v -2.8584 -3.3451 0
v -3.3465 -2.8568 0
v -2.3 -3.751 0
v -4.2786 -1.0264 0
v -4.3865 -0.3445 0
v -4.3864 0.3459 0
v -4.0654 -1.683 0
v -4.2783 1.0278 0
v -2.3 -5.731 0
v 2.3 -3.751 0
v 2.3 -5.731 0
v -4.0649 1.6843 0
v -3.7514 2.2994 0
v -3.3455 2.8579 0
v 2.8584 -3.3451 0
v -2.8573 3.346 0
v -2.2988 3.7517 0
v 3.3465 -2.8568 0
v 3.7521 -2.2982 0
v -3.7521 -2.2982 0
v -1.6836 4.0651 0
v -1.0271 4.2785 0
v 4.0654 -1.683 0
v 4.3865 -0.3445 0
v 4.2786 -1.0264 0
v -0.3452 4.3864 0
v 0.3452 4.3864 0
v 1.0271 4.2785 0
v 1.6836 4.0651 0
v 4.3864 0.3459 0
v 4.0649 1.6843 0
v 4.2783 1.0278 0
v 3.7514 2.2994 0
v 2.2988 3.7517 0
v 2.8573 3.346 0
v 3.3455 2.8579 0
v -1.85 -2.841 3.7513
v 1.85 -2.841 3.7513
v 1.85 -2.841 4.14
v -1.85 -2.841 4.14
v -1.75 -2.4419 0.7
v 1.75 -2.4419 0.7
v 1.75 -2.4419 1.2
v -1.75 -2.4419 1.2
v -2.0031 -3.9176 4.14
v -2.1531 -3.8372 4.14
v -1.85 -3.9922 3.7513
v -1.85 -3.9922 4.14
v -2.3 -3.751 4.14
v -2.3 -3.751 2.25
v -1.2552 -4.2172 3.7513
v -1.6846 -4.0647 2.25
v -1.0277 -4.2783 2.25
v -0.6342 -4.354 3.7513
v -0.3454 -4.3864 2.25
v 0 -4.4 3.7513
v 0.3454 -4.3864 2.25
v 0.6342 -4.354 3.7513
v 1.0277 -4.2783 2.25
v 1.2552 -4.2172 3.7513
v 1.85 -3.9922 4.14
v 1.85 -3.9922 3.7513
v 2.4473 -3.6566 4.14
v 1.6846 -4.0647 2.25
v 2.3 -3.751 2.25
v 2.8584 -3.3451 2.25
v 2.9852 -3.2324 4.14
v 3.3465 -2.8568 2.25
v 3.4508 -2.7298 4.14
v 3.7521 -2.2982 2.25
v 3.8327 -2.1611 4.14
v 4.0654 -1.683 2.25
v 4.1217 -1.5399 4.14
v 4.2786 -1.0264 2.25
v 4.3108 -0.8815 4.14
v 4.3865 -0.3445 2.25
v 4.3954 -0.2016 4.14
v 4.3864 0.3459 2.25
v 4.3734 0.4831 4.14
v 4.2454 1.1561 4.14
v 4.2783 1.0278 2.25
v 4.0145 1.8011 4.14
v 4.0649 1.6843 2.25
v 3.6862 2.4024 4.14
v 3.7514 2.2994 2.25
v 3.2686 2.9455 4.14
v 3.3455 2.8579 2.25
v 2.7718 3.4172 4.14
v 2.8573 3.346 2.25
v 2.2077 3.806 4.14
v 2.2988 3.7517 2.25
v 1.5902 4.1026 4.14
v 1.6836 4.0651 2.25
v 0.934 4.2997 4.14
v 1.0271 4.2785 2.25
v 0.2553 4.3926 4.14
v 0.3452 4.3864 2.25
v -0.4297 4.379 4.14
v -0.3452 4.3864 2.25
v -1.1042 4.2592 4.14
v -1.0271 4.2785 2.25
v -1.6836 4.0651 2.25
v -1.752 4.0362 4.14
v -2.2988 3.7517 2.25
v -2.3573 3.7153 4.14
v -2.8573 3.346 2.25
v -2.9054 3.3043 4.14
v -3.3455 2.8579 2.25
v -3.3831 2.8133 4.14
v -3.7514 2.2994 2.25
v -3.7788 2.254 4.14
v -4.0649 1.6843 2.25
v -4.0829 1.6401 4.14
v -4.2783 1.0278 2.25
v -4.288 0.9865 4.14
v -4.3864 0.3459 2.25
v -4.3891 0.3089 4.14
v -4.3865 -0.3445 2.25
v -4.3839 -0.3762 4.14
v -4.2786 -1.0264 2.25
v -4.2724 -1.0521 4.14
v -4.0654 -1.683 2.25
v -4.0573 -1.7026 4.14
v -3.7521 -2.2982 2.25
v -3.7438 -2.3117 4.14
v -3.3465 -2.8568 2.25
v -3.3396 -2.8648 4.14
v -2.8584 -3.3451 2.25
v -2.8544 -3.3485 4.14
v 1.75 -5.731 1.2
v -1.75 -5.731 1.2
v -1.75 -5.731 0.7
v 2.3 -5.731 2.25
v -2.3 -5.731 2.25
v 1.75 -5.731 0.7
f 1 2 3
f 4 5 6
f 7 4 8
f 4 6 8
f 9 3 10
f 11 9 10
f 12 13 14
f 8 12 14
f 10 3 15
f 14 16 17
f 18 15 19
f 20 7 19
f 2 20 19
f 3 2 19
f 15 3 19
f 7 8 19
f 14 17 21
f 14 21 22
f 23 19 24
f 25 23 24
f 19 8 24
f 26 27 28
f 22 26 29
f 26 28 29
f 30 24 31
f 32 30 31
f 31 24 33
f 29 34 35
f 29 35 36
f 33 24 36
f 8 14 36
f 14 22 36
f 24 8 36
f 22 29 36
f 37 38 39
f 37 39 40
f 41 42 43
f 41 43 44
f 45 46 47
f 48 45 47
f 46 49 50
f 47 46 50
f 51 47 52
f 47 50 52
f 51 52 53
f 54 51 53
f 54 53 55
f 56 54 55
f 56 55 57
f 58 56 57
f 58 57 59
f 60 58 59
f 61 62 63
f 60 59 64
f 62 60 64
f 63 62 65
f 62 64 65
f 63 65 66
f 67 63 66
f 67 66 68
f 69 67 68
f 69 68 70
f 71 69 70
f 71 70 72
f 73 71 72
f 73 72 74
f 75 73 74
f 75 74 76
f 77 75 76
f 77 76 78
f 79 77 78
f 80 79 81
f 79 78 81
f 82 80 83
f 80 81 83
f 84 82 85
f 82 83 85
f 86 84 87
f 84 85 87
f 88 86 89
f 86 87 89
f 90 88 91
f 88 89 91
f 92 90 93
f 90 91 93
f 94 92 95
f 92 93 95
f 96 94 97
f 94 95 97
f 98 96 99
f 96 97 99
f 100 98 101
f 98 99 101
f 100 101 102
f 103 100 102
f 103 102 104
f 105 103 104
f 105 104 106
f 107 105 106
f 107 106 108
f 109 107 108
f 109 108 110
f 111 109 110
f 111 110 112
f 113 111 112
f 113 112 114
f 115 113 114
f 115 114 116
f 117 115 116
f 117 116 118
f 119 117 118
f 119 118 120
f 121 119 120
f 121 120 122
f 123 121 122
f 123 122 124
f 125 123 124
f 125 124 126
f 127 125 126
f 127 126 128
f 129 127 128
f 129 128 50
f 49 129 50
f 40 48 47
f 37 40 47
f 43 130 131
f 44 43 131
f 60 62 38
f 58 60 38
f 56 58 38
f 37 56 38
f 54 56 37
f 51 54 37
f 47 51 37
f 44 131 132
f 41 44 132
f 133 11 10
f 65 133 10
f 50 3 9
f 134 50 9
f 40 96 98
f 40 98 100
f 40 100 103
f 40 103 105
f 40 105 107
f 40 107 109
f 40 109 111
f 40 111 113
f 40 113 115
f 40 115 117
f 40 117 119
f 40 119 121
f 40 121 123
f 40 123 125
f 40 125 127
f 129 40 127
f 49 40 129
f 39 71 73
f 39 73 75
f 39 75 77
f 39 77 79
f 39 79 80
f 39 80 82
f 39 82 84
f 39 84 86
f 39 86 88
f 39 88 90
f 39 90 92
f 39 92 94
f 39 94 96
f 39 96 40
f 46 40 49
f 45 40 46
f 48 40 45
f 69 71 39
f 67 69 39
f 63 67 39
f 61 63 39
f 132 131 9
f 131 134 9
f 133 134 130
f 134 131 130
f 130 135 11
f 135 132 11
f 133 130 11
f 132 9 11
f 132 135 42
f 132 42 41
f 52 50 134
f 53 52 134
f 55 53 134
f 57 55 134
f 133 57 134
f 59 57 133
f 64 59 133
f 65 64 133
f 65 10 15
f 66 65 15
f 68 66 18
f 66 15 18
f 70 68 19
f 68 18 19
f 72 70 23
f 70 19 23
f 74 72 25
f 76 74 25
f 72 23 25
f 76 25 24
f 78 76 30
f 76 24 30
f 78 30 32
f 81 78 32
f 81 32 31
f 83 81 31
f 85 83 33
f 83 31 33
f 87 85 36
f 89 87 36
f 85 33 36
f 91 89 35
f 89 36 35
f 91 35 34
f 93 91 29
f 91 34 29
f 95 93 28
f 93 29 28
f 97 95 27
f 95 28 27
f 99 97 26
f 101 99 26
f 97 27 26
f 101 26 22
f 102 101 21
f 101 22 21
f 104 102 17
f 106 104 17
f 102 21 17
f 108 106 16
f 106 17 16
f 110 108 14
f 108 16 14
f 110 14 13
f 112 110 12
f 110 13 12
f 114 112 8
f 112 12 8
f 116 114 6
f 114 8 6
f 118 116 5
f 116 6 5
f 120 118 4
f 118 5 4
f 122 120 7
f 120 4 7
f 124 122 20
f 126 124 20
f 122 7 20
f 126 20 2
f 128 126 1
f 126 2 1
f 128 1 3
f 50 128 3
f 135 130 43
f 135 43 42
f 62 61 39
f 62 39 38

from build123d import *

# Parameters (mm, degrees)
P_IDAT_VYSUNUT_M1_DEPTH  = 2.25
SKICA2_W                 = 3.5
SKICA2_H                 = 0.5
ODEBRAT_VYSUNUT_M1_DEPTH = 3.289126928
SKICA3_R                 = 4.4
P_IDAT_VYSUNUT_M2_DEPTH  = 1.89
SKICA5_W                 = 3.7
SKICA5_H                 = 1.288072418
ODEBRAT_VYSUNUT_M2_DEPTH = 2.89


with BuildPart() as part:
    # Skica1 → Přidat vysunutím1 (new body)
    with BuildSketch(Plane.XY):
        with BuildLine():
            Line((-2.3, -3.750999867), (-2.3, -5.730999867))
            Line((-2.3, -5.730999867), (2.3, -5.730999867))
            Line((2.3, -5.730999867), (2.3, -3.750999867))
            ThreePointArc((2.3, -3.750999867), (0, 4.4), (-2.3, -3.750999867))
        make_face()
    extrude(amount=P_IDAT_VYSUNUT_M1_DEPTH)

    # Skica2 → Odebrat vysunutím1 (cut)
    with BuildSketch(Plane(origin=(0, -5.730999867, 0), x_dir=(-1, 0, 0), z_dir=(0, -1, 0))):
        with Locations((0, -0.95)):
            Rectangle(SKICA2_W, SKICA2_H)
    extrude(amount=-ODEBRAT_VYSUNUT_M1_DEPTH, mode=Mode.SUBTRACT)

    # Skica3 → Přidat vysunutím2 (add)
    with BuildSketch(Plane.XY.offset(2.25)):
        with Locations(Location((0, 0, 0), (0, 0, 238.484629998))):
            Circle(SKICA3_R)
    extrude(amount=P_IDAT_VYSUNUT_M2_DEPTH)

    # Skica5 → Odebrat vysunutím2 (cut)
    with BuildSketch(Plane(origin=(0, -5.730999867, 0), x_dir=(-1, 0, 0), z_dir=(0, -1, 0))):
        with Locations((0, -4.395369221)):
            Rectangle(SKICA5_W, SKICA5_H)
    extrude(amount=-ODEBRAT_VYSUNUT_M2_DEPTH, mode=Mode.SUBTRACT)


solid = part.part
